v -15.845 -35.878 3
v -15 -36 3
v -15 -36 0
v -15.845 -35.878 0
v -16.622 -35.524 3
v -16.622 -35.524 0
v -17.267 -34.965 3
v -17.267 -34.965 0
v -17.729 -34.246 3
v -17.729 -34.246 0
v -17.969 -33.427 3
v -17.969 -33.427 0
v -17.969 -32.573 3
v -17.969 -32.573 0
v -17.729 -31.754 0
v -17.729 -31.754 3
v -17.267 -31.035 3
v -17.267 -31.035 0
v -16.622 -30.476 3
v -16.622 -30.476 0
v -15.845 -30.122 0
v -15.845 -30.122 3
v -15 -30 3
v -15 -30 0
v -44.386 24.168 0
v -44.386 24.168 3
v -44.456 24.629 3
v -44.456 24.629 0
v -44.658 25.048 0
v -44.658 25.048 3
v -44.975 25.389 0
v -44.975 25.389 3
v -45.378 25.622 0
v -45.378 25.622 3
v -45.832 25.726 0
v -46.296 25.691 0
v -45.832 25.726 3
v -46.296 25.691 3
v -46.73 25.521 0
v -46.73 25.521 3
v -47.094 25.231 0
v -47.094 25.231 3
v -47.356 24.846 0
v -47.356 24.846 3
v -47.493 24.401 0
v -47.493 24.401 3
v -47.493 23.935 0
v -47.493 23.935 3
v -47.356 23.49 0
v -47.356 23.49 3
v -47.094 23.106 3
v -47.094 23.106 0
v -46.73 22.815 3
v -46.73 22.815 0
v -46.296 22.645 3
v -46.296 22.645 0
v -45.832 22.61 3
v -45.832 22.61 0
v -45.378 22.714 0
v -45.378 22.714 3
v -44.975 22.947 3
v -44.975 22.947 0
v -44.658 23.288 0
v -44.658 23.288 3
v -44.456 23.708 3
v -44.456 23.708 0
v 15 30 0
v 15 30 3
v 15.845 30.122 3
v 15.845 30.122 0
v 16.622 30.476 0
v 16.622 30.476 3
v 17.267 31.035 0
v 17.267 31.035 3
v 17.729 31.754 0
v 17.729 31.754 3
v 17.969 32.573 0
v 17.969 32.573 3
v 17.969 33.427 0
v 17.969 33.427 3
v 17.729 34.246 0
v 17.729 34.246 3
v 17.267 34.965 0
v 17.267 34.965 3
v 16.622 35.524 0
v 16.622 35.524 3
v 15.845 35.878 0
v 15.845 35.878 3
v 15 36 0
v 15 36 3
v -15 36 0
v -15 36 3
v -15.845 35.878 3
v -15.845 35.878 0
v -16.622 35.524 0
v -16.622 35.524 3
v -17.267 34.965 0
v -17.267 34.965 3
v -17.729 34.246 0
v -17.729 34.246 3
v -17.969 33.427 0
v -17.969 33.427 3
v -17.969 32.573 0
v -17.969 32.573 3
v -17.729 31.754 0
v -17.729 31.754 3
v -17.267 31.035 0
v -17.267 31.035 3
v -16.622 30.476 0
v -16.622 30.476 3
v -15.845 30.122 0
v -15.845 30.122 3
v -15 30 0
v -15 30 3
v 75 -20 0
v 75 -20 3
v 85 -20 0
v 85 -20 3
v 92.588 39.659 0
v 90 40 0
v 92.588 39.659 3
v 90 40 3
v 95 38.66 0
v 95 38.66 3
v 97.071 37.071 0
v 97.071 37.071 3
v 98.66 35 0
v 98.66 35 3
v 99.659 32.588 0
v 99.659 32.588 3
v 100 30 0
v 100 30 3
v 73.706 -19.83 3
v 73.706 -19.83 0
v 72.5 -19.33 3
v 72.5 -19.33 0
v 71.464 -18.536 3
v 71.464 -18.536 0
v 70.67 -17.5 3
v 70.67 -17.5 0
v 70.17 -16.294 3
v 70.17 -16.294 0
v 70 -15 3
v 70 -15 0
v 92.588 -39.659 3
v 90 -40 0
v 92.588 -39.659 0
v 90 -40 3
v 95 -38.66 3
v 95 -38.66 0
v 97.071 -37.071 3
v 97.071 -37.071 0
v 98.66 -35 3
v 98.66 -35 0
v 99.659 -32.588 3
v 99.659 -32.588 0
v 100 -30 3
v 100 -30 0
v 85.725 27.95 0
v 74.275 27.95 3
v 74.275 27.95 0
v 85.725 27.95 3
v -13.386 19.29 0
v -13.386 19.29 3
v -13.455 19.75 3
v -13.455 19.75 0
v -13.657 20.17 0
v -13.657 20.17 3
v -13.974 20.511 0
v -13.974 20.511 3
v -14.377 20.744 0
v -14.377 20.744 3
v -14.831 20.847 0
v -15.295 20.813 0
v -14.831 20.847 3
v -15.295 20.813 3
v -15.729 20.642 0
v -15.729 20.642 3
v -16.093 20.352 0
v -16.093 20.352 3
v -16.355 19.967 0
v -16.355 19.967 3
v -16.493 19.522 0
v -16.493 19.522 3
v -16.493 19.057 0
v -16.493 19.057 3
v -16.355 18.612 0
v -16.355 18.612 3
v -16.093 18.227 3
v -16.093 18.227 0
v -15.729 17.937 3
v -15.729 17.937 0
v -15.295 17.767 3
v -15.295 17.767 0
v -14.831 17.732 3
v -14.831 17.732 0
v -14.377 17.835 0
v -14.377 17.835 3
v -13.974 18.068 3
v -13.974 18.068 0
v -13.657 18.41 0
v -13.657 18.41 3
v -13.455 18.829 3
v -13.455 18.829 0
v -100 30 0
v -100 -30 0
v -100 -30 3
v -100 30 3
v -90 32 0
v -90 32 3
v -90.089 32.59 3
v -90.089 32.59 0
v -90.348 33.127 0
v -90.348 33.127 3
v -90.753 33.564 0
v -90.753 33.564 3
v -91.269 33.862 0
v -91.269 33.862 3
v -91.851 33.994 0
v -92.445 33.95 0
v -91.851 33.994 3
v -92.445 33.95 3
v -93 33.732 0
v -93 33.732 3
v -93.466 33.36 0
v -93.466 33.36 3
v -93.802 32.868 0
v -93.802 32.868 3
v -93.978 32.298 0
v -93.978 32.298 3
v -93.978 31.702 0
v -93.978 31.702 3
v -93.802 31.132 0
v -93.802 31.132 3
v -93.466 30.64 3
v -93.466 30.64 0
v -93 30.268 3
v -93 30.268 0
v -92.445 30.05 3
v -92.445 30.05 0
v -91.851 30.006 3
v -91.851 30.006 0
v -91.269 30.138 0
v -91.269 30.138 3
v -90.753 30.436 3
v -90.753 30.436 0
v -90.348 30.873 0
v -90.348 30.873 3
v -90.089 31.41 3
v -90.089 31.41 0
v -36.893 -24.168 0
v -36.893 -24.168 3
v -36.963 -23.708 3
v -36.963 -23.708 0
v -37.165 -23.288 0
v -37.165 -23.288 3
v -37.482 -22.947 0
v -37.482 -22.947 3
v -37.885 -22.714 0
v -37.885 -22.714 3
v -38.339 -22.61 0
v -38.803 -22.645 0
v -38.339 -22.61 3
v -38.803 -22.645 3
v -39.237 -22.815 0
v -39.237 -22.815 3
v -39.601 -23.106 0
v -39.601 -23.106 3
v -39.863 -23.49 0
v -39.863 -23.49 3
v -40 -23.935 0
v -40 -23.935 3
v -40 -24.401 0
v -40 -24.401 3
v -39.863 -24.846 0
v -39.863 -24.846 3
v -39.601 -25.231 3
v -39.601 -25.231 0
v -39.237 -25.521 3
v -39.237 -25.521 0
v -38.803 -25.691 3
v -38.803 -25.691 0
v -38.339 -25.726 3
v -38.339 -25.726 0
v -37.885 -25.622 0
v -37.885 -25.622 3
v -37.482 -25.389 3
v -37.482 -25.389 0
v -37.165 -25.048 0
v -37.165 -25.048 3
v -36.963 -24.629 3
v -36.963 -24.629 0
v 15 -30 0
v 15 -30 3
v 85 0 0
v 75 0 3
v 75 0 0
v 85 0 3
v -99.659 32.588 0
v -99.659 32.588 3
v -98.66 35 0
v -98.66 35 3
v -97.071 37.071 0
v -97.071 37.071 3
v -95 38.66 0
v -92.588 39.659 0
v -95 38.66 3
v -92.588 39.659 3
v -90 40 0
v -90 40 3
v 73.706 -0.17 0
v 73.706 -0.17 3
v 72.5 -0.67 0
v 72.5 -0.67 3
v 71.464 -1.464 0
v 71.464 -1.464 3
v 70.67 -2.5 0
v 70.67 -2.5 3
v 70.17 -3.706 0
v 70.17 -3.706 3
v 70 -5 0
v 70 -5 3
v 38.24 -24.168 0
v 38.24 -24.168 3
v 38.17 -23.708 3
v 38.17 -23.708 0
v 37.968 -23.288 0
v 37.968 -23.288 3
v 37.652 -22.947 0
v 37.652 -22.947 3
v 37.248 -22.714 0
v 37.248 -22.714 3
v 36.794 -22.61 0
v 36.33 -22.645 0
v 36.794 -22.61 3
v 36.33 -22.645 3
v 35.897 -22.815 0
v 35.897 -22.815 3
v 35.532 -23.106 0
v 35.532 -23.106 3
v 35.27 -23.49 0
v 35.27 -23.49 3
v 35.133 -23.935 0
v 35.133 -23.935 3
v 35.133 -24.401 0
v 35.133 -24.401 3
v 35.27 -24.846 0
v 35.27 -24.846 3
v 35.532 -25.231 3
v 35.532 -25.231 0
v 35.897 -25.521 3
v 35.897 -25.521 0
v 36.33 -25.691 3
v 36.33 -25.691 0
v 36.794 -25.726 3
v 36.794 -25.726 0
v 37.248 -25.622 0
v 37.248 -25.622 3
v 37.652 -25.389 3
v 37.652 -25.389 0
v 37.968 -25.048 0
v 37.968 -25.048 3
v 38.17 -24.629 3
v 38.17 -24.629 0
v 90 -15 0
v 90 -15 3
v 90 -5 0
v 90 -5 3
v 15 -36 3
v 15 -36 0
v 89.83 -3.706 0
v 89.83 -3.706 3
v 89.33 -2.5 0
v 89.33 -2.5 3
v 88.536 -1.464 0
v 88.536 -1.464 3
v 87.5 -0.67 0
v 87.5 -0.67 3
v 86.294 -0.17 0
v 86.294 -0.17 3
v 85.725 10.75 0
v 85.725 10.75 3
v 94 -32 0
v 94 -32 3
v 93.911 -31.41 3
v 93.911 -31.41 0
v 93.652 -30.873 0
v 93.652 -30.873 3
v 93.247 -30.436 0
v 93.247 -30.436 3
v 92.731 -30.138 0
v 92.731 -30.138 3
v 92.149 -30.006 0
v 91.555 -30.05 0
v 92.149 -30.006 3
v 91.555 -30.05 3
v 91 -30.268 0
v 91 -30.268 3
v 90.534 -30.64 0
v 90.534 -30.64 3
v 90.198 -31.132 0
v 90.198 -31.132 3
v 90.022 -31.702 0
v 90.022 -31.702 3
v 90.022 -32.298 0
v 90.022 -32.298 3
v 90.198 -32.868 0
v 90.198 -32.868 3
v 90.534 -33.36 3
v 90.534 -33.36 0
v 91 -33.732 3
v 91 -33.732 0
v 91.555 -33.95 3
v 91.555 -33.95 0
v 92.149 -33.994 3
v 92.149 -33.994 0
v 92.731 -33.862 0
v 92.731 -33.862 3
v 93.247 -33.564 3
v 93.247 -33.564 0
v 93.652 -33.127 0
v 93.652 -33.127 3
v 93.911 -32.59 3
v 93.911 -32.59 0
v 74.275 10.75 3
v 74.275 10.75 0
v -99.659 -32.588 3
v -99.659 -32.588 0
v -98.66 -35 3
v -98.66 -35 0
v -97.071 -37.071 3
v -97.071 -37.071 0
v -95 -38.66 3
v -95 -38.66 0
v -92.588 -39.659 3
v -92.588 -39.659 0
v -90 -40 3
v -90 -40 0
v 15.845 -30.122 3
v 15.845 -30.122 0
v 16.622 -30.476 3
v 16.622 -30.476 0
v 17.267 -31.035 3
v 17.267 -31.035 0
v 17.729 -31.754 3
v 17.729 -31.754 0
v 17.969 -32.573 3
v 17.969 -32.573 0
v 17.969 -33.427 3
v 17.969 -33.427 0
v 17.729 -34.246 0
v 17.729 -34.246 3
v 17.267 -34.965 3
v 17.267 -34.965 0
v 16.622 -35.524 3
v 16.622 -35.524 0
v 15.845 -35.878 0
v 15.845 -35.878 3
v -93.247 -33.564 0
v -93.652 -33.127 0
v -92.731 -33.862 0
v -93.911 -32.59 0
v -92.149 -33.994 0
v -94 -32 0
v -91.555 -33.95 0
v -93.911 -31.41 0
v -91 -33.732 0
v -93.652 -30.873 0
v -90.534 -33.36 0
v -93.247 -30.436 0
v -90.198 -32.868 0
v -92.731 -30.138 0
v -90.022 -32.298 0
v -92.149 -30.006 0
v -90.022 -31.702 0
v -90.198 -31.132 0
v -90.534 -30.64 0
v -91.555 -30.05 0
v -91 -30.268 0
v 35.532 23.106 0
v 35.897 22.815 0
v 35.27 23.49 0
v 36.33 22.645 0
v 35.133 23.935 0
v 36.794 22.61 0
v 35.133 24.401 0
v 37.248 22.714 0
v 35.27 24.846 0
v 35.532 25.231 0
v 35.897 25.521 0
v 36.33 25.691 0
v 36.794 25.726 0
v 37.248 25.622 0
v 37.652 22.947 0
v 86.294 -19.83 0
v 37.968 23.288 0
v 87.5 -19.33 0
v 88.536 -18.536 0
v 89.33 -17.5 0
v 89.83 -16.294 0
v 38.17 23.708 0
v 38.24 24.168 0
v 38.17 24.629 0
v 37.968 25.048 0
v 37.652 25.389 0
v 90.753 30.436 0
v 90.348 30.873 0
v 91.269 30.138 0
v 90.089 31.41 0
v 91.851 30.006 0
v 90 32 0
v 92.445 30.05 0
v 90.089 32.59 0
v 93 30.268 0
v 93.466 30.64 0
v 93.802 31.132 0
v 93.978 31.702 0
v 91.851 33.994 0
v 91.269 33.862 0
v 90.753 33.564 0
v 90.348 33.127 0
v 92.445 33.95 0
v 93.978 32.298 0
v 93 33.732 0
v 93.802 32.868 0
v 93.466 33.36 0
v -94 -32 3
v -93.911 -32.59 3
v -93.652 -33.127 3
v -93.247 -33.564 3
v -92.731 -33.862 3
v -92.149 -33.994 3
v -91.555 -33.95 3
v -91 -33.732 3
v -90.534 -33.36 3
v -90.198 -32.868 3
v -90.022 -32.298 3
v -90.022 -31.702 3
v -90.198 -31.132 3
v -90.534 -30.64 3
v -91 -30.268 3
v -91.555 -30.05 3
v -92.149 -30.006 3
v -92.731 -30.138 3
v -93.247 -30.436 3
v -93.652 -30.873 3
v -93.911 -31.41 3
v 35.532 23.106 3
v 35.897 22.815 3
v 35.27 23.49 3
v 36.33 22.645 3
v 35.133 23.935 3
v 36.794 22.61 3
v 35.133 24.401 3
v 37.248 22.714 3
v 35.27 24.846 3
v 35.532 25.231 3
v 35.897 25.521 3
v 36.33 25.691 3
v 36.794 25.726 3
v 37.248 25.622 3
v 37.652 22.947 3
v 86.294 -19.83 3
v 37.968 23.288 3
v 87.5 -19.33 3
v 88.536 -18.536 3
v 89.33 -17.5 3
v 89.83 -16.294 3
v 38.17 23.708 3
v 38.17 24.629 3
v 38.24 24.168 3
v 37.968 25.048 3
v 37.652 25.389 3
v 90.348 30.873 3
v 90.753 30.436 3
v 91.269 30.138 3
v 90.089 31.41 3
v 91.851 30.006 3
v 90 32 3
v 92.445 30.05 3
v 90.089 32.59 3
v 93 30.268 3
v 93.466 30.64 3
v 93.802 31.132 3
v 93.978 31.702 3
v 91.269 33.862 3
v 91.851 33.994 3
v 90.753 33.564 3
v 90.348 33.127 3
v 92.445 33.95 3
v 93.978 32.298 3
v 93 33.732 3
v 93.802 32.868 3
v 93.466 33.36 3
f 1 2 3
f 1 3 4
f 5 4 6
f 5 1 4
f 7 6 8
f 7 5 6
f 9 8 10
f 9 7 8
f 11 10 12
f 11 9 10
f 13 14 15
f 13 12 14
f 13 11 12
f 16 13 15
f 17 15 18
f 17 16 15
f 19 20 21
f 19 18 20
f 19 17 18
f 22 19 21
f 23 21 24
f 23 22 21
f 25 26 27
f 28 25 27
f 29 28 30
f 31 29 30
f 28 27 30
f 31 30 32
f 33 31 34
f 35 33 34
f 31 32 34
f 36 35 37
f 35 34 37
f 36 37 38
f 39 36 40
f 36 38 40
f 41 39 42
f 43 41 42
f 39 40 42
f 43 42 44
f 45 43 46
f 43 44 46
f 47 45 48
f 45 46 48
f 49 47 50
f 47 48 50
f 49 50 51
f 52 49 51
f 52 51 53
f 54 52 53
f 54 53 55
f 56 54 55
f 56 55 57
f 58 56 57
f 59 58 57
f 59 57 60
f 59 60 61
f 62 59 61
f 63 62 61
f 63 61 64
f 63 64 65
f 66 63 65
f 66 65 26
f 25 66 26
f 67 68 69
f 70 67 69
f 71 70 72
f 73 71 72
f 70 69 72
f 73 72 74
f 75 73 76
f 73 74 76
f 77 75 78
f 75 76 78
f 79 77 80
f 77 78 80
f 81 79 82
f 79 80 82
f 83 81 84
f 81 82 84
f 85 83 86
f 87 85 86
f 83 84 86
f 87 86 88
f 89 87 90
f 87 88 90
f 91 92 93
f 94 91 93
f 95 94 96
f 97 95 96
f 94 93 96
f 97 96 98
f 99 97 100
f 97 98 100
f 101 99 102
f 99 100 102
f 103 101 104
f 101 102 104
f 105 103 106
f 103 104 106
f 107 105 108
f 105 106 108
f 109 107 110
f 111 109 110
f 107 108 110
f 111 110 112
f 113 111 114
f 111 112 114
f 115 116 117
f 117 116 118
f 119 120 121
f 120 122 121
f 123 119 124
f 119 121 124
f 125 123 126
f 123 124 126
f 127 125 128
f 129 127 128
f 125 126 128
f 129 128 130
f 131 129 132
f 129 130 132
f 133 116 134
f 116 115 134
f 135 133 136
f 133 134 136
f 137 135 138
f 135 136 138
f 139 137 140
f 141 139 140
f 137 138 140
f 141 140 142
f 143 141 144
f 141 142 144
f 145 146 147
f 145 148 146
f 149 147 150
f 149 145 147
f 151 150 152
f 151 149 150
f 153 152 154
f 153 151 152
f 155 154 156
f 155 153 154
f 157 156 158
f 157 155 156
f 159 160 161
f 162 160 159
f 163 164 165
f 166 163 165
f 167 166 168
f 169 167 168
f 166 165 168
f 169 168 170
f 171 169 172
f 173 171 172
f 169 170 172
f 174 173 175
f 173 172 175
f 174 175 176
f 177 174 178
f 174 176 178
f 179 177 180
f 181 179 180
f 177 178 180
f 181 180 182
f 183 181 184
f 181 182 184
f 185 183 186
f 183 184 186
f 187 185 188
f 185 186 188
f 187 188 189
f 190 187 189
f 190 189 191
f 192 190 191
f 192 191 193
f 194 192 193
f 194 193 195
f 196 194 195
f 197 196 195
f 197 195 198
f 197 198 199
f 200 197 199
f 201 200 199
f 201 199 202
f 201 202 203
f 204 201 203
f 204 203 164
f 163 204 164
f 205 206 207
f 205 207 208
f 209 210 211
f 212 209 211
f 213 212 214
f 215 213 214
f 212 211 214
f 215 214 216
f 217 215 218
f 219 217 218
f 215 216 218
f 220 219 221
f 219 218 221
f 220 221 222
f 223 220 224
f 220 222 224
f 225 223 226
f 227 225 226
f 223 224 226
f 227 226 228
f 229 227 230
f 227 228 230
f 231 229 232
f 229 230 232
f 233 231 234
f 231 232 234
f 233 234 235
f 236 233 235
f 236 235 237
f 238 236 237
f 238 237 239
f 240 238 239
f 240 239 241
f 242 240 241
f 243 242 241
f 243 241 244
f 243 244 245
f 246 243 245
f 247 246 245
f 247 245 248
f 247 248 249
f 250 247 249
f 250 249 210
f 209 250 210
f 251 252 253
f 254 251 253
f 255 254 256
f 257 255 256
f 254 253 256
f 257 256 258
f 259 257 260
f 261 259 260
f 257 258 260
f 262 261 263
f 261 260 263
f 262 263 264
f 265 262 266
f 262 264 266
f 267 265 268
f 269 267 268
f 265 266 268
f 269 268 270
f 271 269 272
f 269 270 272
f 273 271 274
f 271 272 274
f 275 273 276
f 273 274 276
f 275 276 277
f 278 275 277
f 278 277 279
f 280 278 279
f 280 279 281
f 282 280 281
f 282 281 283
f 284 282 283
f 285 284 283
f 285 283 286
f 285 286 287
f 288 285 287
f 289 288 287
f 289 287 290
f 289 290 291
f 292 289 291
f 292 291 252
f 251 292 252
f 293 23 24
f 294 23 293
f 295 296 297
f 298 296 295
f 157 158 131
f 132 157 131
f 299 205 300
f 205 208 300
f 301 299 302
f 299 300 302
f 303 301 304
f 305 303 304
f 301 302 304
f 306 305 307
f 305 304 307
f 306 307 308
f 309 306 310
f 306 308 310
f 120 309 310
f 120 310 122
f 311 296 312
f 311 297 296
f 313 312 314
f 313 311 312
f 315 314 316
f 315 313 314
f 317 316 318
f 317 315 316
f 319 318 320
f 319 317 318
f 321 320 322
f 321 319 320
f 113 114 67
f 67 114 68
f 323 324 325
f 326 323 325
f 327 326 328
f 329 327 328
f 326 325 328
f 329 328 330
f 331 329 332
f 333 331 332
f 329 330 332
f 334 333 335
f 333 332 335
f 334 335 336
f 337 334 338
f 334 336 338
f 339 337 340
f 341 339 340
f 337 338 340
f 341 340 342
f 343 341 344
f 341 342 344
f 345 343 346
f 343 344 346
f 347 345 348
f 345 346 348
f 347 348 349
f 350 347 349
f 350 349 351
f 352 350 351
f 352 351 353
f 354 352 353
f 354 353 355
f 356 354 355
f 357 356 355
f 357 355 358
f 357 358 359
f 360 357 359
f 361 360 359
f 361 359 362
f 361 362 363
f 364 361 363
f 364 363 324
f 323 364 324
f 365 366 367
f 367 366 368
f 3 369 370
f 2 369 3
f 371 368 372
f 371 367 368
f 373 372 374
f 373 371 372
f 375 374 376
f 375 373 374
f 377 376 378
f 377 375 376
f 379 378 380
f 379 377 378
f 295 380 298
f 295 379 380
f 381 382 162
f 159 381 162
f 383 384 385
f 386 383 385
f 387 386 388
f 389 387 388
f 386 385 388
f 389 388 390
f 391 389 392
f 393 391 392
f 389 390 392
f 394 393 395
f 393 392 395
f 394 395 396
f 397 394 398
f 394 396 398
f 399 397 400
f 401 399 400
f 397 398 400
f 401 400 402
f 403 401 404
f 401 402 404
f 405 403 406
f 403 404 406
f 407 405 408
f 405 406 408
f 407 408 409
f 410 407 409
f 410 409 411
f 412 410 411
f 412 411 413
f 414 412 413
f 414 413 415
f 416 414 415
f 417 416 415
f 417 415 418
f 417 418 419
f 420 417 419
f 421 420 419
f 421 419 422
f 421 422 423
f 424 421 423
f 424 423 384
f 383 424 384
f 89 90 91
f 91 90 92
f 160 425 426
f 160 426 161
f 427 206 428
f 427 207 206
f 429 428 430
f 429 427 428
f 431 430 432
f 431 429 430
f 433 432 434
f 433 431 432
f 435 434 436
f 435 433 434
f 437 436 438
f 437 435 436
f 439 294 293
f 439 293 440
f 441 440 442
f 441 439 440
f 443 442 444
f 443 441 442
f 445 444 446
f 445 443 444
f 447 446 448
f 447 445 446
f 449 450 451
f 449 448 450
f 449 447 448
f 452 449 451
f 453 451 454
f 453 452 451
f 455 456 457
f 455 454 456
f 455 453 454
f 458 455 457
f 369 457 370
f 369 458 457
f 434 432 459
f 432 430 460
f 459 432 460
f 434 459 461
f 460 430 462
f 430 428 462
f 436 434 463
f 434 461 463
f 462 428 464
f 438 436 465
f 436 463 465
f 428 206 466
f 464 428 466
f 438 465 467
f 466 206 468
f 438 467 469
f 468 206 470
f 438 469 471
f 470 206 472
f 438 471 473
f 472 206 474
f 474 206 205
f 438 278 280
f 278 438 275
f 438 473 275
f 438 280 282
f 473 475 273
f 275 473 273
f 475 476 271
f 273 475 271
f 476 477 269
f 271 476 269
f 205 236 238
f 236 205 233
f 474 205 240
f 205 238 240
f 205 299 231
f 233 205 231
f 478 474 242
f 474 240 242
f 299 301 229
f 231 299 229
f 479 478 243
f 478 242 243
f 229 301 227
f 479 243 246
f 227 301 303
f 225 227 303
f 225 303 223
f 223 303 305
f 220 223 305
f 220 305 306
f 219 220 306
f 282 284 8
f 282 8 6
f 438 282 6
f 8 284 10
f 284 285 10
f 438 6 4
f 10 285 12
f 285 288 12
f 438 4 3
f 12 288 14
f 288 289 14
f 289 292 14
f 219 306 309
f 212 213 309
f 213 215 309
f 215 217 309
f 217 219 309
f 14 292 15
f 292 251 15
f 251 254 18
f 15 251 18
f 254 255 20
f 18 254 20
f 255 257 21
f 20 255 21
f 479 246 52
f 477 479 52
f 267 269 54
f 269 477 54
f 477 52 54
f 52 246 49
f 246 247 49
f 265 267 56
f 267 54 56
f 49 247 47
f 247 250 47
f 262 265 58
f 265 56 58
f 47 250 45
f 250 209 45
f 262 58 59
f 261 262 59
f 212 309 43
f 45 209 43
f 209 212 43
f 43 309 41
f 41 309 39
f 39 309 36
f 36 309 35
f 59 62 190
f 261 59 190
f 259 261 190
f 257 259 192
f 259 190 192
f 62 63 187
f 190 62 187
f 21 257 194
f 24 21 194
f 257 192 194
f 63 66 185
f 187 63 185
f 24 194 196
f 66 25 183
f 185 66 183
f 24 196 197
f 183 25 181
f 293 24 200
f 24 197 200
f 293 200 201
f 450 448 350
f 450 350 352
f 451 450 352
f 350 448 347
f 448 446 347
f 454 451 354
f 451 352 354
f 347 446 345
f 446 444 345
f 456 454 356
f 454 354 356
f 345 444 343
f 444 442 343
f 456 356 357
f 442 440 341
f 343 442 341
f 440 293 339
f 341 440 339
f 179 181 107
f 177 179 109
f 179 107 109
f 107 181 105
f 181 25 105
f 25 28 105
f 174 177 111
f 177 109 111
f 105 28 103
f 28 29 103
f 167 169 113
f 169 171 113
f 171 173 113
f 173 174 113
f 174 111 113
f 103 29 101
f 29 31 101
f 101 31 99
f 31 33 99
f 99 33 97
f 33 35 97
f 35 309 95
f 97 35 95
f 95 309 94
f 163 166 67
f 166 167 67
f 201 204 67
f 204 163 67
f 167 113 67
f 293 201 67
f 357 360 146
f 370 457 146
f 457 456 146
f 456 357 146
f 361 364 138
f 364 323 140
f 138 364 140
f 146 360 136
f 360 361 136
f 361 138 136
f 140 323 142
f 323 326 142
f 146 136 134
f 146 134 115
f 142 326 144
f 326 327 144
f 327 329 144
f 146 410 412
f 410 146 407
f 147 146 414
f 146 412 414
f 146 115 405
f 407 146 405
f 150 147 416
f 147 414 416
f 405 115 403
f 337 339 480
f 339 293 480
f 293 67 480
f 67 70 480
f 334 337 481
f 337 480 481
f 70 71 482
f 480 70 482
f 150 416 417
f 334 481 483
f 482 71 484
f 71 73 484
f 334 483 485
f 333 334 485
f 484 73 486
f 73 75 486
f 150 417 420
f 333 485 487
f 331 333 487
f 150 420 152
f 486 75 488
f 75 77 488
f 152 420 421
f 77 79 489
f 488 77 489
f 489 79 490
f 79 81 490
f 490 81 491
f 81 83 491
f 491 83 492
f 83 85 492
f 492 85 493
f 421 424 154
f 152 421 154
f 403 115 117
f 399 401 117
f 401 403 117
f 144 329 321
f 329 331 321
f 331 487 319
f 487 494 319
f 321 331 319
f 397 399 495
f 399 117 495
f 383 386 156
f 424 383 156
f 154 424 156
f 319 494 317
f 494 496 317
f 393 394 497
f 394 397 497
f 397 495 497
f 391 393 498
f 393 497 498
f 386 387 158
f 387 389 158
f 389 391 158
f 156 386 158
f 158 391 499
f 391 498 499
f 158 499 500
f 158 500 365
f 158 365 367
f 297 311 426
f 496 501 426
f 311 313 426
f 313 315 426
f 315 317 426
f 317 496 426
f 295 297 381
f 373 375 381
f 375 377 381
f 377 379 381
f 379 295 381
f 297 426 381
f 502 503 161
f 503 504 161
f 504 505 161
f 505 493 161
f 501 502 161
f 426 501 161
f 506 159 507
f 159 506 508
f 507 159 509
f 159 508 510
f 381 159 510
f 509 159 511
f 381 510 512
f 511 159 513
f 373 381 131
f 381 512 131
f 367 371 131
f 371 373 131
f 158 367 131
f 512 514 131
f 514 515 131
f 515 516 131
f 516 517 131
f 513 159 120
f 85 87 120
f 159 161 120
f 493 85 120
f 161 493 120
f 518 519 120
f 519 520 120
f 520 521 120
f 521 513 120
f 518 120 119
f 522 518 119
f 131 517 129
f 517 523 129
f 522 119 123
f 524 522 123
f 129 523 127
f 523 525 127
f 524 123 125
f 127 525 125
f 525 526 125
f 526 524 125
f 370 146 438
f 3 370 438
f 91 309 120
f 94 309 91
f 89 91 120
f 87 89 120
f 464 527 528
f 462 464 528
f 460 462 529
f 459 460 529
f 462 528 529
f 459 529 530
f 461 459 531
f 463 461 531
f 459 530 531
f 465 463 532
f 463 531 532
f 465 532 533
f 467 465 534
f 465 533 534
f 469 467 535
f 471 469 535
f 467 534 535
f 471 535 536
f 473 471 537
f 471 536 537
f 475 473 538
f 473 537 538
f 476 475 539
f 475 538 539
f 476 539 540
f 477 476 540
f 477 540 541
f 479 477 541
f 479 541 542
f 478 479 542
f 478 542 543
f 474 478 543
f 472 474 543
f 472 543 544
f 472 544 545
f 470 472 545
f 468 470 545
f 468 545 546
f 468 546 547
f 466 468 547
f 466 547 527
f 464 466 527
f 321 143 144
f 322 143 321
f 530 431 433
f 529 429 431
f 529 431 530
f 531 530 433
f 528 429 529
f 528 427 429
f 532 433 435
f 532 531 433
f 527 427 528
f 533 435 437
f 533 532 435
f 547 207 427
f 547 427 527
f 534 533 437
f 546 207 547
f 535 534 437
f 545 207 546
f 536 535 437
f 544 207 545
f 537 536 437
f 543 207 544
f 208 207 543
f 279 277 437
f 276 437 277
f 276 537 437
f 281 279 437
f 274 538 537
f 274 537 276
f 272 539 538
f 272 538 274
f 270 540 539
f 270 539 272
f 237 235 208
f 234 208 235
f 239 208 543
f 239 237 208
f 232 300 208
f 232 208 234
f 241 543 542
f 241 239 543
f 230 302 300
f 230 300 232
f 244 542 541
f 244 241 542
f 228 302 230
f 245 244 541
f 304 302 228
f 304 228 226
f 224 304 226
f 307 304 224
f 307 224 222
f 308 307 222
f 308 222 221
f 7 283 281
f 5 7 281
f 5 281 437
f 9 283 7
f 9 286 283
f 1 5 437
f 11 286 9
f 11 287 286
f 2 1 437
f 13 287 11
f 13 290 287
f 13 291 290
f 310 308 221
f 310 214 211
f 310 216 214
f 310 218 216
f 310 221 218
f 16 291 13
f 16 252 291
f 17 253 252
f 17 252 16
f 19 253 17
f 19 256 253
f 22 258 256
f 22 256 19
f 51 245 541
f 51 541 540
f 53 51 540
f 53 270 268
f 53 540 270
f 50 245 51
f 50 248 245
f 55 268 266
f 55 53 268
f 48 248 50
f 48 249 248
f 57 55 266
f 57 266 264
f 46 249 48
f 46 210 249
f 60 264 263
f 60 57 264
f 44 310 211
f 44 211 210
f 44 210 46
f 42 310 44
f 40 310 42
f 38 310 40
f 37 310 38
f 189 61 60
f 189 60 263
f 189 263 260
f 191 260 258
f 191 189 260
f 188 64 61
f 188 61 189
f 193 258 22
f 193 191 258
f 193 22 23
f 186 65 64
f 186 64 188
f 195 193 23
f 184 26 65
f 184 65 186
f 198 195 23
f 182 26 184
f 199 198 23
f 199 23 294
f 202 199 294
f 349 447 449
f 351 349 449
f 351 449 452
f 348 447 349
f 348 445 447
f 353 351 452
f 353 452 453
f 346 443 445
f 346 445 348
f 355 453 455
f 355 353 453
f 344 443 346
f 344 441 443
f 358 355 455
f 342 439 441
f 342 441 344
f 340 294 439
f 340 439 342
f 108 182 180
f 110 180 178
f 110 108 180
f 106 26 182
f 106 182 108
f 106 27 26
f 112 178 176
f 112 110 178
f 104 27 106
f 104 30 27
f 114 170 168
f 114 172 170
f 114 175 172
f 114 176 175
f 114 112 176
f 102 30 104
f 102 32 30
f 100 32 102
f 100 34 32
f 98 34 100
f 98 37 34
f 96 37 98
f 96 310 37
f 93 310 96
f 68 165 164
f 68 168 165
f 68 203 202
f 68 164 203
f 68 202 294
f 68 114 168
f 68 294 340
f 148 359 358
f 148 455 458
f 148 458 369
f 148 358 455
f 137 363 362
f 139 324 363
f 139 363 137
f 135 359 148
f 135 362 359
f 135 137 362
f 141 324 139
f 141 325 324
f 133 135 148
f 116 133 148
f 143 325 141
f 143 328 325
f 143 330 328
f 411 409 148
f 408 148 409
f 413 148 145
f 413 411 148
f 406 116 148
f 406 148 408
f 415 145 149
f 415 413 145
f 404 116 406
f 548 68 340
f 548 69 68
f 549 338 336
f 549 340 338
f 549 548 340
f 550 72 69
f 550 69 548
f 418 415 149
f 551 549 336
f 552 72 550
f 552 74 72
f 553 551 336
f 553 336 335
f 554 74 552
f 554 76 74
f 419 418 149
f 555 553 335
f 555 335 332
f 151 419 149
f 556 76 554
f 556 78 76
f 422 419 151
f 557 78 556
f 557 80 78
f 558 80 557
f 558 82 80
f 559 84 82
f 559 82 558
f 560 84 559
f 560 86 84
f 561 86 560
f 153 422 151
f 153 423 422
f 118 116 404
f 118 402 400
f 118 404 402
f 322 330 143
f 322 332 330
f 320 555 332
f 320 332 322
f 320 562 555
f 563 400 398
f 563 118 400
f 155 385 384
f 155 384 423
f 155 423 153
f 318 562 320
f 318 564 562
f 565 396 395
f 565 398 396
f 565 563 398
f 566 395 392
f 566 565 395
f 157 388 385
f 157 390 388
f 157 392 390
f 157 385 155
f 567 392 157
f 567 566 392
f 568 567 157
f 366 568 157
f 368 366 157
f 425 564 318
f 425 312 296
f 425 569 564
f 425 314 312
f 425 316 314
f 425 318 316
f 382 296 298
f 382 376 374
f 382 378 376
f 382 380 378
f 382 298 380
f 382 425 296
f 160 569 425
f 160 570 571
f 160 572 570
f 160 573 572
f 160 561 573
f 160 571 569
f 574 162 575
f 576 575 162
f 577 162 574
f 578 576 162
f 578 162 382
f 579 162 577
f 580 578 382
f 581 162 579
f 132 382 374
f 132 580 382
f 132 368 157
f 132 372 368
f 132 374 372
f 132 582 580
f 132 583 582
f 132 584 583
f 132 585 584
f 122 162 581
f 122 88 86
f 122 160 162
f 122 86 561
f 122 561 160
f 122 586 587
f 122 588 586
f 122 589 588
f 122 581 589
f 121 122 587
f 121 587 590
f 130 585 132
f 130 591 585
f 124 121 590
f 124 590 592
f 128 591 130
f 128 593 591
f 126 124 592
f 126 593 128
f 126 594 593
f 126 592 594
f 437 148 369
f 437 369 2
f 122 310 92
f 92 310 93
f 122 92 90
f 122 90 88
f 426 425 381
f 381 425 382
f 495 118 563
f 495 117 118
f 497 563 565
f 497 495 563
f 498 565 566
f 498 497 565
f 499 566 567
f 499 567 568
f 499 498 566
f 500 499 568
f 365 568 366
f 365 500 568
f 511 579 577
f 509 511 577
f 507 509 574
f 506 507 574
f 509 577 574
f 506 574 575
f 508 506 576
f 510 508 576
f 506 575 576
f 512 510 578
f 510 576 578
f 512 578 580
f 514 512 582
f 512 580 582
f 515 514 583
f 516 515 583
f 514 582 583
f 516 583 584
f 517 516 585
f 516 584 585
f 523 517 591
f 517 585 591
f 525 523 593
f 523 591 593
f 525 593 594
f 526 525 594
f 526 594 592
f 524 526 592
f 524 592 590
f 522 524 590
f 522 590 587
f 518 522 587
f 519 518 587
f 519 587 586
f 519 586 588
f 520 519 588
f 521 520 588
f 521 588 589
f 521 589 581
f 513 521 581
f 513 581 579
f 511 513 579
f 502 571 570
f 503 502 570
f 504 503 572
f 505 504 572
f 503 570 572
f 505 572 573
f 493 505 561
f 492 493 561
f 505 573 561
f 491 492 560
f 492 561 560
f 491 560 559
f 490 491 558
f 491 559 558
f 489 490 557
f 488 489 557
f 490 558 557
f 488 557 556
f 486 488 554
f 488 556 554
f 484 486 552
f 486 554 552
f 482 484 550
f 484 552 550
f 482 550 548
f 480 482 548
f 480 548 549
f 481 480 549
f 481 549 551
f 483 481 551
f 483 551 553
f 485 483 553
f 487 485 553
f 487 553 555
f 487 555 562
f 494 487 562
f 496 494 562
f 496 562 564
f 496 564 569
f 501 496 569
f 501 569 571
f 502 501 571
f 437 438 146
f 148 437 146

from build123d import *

# Parameters (mm, degrees)
SKETCH1_W           = 200
SKETCH1_H           = 80
BOSS_EXTRUDE1_DEPTH = 3
SKETCH2_R           = 2
CUT_EXTRUDE1_DEPTH  = 108.745069493
FILLET1_R           = 10
SKETCH3_R           = 1.5621
CUT_EXTRUDE2_DEPTH  = 108.745069493
SKETCH4_W           = 20
SKETCH4_H           = 20
CUT_EXTRUDE3_DEPTH  = 108.745069493
FILLET2_R           = 5
CUT_EXTRUDE4_DEPTH  = 108.745069493
SKETCH6_W           = 11.45
SKETCH6_H           = 17.2
CUT_EXTRUDE5_DEPTH  = 108.745069493


with BuildPart() as part:
    # Sketch1 → Boss-Extrude1 (new body)
    with BuildSketch(Plane.XY):
        Rectangle(SKETCH1_W, SKETCH1_H)
    extrude(amount=BOSS_EXTRUDE1_DEPTH)

    # Sketch2 → Cut-Extrude1 (cut, through all)
    with BuildSketch(Plane.XY.offset(3)):
        with Locations((-92, 32)):
            Circle(SKETCH2_R)
        with Locations(Location((-92, -32, 0), (0, 0, 180))):
            Circle(SKETCH2_R)
        with Locations((92, -32)):
            Circle(SKETCH2_R)
        with Locations(Location((92, 32, 0), (0, 0, 180))):
            Circle(SKETCH2_R)
    extrude(amount=-CUT_EXTRUDE1_DEPTH, mode=Mode.SUBTRACT)

    # Fillet1
    fillet1_edges = [part.edges().sort_by_distance(p)[0] for p in [
        (100, -40, 1.5),
        (-100, -40, 1.5),
        (-100, 40, 1.5),
        (100, 40, 1.5),
    ]]
    fillet(fillet1_edges, radius=FILLET1_R)

    # Sketch3 → Cut-Extrude2 (cut, through all)
    with BuildSketch(Plane.XY.offset(3)):
        with Locations((36.6776, 24.1681)):
            Circle(SKETCH3_R)
        with Locations((36.6776, -24.1681)):
            Circle(SKETCH3_R)
        with Locations((-38.4556, -24.1681)):
            Circle(SKETCH3_R)
        with Locations((-45.9486, 24.1681)):
            Circle(SKETCH3_R)
        with Locations((-14.9479, 19.289607234)):
            Circle(SKETCH3_R)
    extrude(amount=-CUT_EXTRUDE2_DEPTH, mode=Mode.SUBTRACT)

    # Sketch4 → Cut-Extrude3 (cut, through all)
    with BuildSketch(Plane.XY.offset(3)):
        with Locations((80, -10)):
            Rectangle(SKETCH4_W, SKETCH4_H)
    extrude(amount=-CUT_EXTRUDE3_DEPTH, mode=Mode.SUBTRACT)

    # Fillet2
    fillet2_edges = [part.edges().sort_by_distance(p)[0] for p in [
        (90, 0, 1.5),
        (90, -20, 1.5),
        (70, -20, 1.5),
        (70, 0, 1.5),
    ]]
    fillet(fillet2_edges, radius=FILLET2_R)

    # Sketch5 → Cut-Extrude4 (cut, through all)
    with BuildSketch(Plane.XY.offset(3)):
        with BuildLine():
            Line((-15, -30), (15, -30))
            ThreePointArc((15, -30), (18, -33), (15, -36))
            Line((15, -36), (-15, -36))
            ThreePointArc((-15, -36), (-18, -33), (-15, -30))
        make_face()
        with BuildLine():
            Line((-15, 30), (15, 30))
            ThreePointArc((15, 30), (18, 33), (15, 36))
            Line((15, 36), (-15, 36))
            ThreePointArc((-15, 36), (-18, 33), (-15, 30))
        make_face()
    extrude(amount=-CUT_EXTRUDE4_DEPTH, mode=Mode.SUBTRACT)

    # Sketch6 → Cut-Extrude5 (cut, through all)
    with BuildSketch(Plane.XY.offset(3)):
        with Locations((80, 19.35)):
            Rectangle(SKETCH6_W, SKETCH6_H)
    extrude(amount=-CUT_EXTRUDE5_DEPTH, mode=Mode.SUBTRACT)


solid = part.part
